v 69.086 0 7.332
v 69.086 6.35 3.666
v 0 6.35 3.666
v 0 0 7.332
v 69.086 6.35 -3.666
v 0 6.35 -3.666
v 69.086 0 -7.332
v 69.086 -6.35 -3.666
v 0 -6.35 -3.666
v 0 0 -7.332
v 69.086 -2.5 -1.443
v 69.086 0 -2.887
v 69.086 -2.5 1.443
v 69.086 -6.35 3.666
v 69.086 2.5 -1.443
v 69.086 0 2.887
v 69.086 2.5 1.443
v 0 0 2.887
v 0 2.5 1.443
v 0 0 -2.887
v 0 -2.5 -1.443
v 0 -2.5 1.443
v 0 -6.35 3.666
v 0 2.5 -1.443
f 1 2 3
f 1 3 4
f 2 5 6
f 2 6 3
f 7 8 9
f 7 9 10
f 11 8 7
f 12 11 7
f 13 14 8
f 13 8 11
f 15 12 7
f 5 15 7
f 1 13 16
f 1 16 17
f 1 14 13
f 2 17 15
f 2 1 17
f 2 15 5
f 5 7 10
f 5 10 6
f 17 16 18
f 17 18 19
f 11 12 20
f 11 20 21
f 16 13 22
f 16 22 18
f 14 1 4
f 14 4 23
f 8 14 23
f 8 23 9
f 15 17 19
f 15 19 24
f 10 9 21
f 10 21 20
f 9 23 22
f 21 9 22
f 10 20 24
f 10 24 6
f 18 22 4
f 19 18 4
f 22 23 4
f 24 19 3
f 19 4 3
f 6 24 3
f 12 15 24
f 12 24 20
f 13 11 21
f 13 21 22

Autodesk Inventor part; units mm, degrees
ref_plane "YZ Plane" through (0, 0, 0) normal (1, 0, 0) x (0, 1, 0)
ref_plane "XZ Plane" through (0, 0, 0) normal (0, 1, 0) x (-1, 0, 0)
ref_plane "XY Plane" through (0, 0, 0) normal (0, 0, 1) x (1, 0, 0)
sketch "Sketch1" plane through (0, 0, 0) normal (1, 0, 0) x (0, 1, 0)
  line L0 (-6.35, -3.6662) -> (0, -7.3323)
  line L1 (-6.35, 3.6662) -> (-6.35, -3.6662)
  line L2 (0, 7.3323) -> (-6.35, 3.6662)
  line L3 (6.35, 3.6662) -> (0, 7.3323)
  line L4 (6.35, -3.6662) -> (6.35, 3.6662)
  line L5 (0, -7.3323) -> (6.35, -3.6662)
  line L6 (2.5, -1.4434) -> (0, -2.8868)
  line L7 (0, -2.8868) -> (-2.5, -1.4434)
  line L8 (-2.5, -1.4434) -> (-2.5, 1.4434)
  line L9 (-2.5, 1.4434) -> (0, 2.8868)
  line L10 (0, 2.8868) -> (2.5, 1.4434)
  line L11 (2.5, 1.4434) -> (2.5, -1.4434)
  point P0 (0, 0)
  point P1 (0, 0)
  dimension "d0" = 5
extrude "Extrusion1" add sketch "Sketch1" along normal blind 69.0855
properties part number "500H x 50mm"
